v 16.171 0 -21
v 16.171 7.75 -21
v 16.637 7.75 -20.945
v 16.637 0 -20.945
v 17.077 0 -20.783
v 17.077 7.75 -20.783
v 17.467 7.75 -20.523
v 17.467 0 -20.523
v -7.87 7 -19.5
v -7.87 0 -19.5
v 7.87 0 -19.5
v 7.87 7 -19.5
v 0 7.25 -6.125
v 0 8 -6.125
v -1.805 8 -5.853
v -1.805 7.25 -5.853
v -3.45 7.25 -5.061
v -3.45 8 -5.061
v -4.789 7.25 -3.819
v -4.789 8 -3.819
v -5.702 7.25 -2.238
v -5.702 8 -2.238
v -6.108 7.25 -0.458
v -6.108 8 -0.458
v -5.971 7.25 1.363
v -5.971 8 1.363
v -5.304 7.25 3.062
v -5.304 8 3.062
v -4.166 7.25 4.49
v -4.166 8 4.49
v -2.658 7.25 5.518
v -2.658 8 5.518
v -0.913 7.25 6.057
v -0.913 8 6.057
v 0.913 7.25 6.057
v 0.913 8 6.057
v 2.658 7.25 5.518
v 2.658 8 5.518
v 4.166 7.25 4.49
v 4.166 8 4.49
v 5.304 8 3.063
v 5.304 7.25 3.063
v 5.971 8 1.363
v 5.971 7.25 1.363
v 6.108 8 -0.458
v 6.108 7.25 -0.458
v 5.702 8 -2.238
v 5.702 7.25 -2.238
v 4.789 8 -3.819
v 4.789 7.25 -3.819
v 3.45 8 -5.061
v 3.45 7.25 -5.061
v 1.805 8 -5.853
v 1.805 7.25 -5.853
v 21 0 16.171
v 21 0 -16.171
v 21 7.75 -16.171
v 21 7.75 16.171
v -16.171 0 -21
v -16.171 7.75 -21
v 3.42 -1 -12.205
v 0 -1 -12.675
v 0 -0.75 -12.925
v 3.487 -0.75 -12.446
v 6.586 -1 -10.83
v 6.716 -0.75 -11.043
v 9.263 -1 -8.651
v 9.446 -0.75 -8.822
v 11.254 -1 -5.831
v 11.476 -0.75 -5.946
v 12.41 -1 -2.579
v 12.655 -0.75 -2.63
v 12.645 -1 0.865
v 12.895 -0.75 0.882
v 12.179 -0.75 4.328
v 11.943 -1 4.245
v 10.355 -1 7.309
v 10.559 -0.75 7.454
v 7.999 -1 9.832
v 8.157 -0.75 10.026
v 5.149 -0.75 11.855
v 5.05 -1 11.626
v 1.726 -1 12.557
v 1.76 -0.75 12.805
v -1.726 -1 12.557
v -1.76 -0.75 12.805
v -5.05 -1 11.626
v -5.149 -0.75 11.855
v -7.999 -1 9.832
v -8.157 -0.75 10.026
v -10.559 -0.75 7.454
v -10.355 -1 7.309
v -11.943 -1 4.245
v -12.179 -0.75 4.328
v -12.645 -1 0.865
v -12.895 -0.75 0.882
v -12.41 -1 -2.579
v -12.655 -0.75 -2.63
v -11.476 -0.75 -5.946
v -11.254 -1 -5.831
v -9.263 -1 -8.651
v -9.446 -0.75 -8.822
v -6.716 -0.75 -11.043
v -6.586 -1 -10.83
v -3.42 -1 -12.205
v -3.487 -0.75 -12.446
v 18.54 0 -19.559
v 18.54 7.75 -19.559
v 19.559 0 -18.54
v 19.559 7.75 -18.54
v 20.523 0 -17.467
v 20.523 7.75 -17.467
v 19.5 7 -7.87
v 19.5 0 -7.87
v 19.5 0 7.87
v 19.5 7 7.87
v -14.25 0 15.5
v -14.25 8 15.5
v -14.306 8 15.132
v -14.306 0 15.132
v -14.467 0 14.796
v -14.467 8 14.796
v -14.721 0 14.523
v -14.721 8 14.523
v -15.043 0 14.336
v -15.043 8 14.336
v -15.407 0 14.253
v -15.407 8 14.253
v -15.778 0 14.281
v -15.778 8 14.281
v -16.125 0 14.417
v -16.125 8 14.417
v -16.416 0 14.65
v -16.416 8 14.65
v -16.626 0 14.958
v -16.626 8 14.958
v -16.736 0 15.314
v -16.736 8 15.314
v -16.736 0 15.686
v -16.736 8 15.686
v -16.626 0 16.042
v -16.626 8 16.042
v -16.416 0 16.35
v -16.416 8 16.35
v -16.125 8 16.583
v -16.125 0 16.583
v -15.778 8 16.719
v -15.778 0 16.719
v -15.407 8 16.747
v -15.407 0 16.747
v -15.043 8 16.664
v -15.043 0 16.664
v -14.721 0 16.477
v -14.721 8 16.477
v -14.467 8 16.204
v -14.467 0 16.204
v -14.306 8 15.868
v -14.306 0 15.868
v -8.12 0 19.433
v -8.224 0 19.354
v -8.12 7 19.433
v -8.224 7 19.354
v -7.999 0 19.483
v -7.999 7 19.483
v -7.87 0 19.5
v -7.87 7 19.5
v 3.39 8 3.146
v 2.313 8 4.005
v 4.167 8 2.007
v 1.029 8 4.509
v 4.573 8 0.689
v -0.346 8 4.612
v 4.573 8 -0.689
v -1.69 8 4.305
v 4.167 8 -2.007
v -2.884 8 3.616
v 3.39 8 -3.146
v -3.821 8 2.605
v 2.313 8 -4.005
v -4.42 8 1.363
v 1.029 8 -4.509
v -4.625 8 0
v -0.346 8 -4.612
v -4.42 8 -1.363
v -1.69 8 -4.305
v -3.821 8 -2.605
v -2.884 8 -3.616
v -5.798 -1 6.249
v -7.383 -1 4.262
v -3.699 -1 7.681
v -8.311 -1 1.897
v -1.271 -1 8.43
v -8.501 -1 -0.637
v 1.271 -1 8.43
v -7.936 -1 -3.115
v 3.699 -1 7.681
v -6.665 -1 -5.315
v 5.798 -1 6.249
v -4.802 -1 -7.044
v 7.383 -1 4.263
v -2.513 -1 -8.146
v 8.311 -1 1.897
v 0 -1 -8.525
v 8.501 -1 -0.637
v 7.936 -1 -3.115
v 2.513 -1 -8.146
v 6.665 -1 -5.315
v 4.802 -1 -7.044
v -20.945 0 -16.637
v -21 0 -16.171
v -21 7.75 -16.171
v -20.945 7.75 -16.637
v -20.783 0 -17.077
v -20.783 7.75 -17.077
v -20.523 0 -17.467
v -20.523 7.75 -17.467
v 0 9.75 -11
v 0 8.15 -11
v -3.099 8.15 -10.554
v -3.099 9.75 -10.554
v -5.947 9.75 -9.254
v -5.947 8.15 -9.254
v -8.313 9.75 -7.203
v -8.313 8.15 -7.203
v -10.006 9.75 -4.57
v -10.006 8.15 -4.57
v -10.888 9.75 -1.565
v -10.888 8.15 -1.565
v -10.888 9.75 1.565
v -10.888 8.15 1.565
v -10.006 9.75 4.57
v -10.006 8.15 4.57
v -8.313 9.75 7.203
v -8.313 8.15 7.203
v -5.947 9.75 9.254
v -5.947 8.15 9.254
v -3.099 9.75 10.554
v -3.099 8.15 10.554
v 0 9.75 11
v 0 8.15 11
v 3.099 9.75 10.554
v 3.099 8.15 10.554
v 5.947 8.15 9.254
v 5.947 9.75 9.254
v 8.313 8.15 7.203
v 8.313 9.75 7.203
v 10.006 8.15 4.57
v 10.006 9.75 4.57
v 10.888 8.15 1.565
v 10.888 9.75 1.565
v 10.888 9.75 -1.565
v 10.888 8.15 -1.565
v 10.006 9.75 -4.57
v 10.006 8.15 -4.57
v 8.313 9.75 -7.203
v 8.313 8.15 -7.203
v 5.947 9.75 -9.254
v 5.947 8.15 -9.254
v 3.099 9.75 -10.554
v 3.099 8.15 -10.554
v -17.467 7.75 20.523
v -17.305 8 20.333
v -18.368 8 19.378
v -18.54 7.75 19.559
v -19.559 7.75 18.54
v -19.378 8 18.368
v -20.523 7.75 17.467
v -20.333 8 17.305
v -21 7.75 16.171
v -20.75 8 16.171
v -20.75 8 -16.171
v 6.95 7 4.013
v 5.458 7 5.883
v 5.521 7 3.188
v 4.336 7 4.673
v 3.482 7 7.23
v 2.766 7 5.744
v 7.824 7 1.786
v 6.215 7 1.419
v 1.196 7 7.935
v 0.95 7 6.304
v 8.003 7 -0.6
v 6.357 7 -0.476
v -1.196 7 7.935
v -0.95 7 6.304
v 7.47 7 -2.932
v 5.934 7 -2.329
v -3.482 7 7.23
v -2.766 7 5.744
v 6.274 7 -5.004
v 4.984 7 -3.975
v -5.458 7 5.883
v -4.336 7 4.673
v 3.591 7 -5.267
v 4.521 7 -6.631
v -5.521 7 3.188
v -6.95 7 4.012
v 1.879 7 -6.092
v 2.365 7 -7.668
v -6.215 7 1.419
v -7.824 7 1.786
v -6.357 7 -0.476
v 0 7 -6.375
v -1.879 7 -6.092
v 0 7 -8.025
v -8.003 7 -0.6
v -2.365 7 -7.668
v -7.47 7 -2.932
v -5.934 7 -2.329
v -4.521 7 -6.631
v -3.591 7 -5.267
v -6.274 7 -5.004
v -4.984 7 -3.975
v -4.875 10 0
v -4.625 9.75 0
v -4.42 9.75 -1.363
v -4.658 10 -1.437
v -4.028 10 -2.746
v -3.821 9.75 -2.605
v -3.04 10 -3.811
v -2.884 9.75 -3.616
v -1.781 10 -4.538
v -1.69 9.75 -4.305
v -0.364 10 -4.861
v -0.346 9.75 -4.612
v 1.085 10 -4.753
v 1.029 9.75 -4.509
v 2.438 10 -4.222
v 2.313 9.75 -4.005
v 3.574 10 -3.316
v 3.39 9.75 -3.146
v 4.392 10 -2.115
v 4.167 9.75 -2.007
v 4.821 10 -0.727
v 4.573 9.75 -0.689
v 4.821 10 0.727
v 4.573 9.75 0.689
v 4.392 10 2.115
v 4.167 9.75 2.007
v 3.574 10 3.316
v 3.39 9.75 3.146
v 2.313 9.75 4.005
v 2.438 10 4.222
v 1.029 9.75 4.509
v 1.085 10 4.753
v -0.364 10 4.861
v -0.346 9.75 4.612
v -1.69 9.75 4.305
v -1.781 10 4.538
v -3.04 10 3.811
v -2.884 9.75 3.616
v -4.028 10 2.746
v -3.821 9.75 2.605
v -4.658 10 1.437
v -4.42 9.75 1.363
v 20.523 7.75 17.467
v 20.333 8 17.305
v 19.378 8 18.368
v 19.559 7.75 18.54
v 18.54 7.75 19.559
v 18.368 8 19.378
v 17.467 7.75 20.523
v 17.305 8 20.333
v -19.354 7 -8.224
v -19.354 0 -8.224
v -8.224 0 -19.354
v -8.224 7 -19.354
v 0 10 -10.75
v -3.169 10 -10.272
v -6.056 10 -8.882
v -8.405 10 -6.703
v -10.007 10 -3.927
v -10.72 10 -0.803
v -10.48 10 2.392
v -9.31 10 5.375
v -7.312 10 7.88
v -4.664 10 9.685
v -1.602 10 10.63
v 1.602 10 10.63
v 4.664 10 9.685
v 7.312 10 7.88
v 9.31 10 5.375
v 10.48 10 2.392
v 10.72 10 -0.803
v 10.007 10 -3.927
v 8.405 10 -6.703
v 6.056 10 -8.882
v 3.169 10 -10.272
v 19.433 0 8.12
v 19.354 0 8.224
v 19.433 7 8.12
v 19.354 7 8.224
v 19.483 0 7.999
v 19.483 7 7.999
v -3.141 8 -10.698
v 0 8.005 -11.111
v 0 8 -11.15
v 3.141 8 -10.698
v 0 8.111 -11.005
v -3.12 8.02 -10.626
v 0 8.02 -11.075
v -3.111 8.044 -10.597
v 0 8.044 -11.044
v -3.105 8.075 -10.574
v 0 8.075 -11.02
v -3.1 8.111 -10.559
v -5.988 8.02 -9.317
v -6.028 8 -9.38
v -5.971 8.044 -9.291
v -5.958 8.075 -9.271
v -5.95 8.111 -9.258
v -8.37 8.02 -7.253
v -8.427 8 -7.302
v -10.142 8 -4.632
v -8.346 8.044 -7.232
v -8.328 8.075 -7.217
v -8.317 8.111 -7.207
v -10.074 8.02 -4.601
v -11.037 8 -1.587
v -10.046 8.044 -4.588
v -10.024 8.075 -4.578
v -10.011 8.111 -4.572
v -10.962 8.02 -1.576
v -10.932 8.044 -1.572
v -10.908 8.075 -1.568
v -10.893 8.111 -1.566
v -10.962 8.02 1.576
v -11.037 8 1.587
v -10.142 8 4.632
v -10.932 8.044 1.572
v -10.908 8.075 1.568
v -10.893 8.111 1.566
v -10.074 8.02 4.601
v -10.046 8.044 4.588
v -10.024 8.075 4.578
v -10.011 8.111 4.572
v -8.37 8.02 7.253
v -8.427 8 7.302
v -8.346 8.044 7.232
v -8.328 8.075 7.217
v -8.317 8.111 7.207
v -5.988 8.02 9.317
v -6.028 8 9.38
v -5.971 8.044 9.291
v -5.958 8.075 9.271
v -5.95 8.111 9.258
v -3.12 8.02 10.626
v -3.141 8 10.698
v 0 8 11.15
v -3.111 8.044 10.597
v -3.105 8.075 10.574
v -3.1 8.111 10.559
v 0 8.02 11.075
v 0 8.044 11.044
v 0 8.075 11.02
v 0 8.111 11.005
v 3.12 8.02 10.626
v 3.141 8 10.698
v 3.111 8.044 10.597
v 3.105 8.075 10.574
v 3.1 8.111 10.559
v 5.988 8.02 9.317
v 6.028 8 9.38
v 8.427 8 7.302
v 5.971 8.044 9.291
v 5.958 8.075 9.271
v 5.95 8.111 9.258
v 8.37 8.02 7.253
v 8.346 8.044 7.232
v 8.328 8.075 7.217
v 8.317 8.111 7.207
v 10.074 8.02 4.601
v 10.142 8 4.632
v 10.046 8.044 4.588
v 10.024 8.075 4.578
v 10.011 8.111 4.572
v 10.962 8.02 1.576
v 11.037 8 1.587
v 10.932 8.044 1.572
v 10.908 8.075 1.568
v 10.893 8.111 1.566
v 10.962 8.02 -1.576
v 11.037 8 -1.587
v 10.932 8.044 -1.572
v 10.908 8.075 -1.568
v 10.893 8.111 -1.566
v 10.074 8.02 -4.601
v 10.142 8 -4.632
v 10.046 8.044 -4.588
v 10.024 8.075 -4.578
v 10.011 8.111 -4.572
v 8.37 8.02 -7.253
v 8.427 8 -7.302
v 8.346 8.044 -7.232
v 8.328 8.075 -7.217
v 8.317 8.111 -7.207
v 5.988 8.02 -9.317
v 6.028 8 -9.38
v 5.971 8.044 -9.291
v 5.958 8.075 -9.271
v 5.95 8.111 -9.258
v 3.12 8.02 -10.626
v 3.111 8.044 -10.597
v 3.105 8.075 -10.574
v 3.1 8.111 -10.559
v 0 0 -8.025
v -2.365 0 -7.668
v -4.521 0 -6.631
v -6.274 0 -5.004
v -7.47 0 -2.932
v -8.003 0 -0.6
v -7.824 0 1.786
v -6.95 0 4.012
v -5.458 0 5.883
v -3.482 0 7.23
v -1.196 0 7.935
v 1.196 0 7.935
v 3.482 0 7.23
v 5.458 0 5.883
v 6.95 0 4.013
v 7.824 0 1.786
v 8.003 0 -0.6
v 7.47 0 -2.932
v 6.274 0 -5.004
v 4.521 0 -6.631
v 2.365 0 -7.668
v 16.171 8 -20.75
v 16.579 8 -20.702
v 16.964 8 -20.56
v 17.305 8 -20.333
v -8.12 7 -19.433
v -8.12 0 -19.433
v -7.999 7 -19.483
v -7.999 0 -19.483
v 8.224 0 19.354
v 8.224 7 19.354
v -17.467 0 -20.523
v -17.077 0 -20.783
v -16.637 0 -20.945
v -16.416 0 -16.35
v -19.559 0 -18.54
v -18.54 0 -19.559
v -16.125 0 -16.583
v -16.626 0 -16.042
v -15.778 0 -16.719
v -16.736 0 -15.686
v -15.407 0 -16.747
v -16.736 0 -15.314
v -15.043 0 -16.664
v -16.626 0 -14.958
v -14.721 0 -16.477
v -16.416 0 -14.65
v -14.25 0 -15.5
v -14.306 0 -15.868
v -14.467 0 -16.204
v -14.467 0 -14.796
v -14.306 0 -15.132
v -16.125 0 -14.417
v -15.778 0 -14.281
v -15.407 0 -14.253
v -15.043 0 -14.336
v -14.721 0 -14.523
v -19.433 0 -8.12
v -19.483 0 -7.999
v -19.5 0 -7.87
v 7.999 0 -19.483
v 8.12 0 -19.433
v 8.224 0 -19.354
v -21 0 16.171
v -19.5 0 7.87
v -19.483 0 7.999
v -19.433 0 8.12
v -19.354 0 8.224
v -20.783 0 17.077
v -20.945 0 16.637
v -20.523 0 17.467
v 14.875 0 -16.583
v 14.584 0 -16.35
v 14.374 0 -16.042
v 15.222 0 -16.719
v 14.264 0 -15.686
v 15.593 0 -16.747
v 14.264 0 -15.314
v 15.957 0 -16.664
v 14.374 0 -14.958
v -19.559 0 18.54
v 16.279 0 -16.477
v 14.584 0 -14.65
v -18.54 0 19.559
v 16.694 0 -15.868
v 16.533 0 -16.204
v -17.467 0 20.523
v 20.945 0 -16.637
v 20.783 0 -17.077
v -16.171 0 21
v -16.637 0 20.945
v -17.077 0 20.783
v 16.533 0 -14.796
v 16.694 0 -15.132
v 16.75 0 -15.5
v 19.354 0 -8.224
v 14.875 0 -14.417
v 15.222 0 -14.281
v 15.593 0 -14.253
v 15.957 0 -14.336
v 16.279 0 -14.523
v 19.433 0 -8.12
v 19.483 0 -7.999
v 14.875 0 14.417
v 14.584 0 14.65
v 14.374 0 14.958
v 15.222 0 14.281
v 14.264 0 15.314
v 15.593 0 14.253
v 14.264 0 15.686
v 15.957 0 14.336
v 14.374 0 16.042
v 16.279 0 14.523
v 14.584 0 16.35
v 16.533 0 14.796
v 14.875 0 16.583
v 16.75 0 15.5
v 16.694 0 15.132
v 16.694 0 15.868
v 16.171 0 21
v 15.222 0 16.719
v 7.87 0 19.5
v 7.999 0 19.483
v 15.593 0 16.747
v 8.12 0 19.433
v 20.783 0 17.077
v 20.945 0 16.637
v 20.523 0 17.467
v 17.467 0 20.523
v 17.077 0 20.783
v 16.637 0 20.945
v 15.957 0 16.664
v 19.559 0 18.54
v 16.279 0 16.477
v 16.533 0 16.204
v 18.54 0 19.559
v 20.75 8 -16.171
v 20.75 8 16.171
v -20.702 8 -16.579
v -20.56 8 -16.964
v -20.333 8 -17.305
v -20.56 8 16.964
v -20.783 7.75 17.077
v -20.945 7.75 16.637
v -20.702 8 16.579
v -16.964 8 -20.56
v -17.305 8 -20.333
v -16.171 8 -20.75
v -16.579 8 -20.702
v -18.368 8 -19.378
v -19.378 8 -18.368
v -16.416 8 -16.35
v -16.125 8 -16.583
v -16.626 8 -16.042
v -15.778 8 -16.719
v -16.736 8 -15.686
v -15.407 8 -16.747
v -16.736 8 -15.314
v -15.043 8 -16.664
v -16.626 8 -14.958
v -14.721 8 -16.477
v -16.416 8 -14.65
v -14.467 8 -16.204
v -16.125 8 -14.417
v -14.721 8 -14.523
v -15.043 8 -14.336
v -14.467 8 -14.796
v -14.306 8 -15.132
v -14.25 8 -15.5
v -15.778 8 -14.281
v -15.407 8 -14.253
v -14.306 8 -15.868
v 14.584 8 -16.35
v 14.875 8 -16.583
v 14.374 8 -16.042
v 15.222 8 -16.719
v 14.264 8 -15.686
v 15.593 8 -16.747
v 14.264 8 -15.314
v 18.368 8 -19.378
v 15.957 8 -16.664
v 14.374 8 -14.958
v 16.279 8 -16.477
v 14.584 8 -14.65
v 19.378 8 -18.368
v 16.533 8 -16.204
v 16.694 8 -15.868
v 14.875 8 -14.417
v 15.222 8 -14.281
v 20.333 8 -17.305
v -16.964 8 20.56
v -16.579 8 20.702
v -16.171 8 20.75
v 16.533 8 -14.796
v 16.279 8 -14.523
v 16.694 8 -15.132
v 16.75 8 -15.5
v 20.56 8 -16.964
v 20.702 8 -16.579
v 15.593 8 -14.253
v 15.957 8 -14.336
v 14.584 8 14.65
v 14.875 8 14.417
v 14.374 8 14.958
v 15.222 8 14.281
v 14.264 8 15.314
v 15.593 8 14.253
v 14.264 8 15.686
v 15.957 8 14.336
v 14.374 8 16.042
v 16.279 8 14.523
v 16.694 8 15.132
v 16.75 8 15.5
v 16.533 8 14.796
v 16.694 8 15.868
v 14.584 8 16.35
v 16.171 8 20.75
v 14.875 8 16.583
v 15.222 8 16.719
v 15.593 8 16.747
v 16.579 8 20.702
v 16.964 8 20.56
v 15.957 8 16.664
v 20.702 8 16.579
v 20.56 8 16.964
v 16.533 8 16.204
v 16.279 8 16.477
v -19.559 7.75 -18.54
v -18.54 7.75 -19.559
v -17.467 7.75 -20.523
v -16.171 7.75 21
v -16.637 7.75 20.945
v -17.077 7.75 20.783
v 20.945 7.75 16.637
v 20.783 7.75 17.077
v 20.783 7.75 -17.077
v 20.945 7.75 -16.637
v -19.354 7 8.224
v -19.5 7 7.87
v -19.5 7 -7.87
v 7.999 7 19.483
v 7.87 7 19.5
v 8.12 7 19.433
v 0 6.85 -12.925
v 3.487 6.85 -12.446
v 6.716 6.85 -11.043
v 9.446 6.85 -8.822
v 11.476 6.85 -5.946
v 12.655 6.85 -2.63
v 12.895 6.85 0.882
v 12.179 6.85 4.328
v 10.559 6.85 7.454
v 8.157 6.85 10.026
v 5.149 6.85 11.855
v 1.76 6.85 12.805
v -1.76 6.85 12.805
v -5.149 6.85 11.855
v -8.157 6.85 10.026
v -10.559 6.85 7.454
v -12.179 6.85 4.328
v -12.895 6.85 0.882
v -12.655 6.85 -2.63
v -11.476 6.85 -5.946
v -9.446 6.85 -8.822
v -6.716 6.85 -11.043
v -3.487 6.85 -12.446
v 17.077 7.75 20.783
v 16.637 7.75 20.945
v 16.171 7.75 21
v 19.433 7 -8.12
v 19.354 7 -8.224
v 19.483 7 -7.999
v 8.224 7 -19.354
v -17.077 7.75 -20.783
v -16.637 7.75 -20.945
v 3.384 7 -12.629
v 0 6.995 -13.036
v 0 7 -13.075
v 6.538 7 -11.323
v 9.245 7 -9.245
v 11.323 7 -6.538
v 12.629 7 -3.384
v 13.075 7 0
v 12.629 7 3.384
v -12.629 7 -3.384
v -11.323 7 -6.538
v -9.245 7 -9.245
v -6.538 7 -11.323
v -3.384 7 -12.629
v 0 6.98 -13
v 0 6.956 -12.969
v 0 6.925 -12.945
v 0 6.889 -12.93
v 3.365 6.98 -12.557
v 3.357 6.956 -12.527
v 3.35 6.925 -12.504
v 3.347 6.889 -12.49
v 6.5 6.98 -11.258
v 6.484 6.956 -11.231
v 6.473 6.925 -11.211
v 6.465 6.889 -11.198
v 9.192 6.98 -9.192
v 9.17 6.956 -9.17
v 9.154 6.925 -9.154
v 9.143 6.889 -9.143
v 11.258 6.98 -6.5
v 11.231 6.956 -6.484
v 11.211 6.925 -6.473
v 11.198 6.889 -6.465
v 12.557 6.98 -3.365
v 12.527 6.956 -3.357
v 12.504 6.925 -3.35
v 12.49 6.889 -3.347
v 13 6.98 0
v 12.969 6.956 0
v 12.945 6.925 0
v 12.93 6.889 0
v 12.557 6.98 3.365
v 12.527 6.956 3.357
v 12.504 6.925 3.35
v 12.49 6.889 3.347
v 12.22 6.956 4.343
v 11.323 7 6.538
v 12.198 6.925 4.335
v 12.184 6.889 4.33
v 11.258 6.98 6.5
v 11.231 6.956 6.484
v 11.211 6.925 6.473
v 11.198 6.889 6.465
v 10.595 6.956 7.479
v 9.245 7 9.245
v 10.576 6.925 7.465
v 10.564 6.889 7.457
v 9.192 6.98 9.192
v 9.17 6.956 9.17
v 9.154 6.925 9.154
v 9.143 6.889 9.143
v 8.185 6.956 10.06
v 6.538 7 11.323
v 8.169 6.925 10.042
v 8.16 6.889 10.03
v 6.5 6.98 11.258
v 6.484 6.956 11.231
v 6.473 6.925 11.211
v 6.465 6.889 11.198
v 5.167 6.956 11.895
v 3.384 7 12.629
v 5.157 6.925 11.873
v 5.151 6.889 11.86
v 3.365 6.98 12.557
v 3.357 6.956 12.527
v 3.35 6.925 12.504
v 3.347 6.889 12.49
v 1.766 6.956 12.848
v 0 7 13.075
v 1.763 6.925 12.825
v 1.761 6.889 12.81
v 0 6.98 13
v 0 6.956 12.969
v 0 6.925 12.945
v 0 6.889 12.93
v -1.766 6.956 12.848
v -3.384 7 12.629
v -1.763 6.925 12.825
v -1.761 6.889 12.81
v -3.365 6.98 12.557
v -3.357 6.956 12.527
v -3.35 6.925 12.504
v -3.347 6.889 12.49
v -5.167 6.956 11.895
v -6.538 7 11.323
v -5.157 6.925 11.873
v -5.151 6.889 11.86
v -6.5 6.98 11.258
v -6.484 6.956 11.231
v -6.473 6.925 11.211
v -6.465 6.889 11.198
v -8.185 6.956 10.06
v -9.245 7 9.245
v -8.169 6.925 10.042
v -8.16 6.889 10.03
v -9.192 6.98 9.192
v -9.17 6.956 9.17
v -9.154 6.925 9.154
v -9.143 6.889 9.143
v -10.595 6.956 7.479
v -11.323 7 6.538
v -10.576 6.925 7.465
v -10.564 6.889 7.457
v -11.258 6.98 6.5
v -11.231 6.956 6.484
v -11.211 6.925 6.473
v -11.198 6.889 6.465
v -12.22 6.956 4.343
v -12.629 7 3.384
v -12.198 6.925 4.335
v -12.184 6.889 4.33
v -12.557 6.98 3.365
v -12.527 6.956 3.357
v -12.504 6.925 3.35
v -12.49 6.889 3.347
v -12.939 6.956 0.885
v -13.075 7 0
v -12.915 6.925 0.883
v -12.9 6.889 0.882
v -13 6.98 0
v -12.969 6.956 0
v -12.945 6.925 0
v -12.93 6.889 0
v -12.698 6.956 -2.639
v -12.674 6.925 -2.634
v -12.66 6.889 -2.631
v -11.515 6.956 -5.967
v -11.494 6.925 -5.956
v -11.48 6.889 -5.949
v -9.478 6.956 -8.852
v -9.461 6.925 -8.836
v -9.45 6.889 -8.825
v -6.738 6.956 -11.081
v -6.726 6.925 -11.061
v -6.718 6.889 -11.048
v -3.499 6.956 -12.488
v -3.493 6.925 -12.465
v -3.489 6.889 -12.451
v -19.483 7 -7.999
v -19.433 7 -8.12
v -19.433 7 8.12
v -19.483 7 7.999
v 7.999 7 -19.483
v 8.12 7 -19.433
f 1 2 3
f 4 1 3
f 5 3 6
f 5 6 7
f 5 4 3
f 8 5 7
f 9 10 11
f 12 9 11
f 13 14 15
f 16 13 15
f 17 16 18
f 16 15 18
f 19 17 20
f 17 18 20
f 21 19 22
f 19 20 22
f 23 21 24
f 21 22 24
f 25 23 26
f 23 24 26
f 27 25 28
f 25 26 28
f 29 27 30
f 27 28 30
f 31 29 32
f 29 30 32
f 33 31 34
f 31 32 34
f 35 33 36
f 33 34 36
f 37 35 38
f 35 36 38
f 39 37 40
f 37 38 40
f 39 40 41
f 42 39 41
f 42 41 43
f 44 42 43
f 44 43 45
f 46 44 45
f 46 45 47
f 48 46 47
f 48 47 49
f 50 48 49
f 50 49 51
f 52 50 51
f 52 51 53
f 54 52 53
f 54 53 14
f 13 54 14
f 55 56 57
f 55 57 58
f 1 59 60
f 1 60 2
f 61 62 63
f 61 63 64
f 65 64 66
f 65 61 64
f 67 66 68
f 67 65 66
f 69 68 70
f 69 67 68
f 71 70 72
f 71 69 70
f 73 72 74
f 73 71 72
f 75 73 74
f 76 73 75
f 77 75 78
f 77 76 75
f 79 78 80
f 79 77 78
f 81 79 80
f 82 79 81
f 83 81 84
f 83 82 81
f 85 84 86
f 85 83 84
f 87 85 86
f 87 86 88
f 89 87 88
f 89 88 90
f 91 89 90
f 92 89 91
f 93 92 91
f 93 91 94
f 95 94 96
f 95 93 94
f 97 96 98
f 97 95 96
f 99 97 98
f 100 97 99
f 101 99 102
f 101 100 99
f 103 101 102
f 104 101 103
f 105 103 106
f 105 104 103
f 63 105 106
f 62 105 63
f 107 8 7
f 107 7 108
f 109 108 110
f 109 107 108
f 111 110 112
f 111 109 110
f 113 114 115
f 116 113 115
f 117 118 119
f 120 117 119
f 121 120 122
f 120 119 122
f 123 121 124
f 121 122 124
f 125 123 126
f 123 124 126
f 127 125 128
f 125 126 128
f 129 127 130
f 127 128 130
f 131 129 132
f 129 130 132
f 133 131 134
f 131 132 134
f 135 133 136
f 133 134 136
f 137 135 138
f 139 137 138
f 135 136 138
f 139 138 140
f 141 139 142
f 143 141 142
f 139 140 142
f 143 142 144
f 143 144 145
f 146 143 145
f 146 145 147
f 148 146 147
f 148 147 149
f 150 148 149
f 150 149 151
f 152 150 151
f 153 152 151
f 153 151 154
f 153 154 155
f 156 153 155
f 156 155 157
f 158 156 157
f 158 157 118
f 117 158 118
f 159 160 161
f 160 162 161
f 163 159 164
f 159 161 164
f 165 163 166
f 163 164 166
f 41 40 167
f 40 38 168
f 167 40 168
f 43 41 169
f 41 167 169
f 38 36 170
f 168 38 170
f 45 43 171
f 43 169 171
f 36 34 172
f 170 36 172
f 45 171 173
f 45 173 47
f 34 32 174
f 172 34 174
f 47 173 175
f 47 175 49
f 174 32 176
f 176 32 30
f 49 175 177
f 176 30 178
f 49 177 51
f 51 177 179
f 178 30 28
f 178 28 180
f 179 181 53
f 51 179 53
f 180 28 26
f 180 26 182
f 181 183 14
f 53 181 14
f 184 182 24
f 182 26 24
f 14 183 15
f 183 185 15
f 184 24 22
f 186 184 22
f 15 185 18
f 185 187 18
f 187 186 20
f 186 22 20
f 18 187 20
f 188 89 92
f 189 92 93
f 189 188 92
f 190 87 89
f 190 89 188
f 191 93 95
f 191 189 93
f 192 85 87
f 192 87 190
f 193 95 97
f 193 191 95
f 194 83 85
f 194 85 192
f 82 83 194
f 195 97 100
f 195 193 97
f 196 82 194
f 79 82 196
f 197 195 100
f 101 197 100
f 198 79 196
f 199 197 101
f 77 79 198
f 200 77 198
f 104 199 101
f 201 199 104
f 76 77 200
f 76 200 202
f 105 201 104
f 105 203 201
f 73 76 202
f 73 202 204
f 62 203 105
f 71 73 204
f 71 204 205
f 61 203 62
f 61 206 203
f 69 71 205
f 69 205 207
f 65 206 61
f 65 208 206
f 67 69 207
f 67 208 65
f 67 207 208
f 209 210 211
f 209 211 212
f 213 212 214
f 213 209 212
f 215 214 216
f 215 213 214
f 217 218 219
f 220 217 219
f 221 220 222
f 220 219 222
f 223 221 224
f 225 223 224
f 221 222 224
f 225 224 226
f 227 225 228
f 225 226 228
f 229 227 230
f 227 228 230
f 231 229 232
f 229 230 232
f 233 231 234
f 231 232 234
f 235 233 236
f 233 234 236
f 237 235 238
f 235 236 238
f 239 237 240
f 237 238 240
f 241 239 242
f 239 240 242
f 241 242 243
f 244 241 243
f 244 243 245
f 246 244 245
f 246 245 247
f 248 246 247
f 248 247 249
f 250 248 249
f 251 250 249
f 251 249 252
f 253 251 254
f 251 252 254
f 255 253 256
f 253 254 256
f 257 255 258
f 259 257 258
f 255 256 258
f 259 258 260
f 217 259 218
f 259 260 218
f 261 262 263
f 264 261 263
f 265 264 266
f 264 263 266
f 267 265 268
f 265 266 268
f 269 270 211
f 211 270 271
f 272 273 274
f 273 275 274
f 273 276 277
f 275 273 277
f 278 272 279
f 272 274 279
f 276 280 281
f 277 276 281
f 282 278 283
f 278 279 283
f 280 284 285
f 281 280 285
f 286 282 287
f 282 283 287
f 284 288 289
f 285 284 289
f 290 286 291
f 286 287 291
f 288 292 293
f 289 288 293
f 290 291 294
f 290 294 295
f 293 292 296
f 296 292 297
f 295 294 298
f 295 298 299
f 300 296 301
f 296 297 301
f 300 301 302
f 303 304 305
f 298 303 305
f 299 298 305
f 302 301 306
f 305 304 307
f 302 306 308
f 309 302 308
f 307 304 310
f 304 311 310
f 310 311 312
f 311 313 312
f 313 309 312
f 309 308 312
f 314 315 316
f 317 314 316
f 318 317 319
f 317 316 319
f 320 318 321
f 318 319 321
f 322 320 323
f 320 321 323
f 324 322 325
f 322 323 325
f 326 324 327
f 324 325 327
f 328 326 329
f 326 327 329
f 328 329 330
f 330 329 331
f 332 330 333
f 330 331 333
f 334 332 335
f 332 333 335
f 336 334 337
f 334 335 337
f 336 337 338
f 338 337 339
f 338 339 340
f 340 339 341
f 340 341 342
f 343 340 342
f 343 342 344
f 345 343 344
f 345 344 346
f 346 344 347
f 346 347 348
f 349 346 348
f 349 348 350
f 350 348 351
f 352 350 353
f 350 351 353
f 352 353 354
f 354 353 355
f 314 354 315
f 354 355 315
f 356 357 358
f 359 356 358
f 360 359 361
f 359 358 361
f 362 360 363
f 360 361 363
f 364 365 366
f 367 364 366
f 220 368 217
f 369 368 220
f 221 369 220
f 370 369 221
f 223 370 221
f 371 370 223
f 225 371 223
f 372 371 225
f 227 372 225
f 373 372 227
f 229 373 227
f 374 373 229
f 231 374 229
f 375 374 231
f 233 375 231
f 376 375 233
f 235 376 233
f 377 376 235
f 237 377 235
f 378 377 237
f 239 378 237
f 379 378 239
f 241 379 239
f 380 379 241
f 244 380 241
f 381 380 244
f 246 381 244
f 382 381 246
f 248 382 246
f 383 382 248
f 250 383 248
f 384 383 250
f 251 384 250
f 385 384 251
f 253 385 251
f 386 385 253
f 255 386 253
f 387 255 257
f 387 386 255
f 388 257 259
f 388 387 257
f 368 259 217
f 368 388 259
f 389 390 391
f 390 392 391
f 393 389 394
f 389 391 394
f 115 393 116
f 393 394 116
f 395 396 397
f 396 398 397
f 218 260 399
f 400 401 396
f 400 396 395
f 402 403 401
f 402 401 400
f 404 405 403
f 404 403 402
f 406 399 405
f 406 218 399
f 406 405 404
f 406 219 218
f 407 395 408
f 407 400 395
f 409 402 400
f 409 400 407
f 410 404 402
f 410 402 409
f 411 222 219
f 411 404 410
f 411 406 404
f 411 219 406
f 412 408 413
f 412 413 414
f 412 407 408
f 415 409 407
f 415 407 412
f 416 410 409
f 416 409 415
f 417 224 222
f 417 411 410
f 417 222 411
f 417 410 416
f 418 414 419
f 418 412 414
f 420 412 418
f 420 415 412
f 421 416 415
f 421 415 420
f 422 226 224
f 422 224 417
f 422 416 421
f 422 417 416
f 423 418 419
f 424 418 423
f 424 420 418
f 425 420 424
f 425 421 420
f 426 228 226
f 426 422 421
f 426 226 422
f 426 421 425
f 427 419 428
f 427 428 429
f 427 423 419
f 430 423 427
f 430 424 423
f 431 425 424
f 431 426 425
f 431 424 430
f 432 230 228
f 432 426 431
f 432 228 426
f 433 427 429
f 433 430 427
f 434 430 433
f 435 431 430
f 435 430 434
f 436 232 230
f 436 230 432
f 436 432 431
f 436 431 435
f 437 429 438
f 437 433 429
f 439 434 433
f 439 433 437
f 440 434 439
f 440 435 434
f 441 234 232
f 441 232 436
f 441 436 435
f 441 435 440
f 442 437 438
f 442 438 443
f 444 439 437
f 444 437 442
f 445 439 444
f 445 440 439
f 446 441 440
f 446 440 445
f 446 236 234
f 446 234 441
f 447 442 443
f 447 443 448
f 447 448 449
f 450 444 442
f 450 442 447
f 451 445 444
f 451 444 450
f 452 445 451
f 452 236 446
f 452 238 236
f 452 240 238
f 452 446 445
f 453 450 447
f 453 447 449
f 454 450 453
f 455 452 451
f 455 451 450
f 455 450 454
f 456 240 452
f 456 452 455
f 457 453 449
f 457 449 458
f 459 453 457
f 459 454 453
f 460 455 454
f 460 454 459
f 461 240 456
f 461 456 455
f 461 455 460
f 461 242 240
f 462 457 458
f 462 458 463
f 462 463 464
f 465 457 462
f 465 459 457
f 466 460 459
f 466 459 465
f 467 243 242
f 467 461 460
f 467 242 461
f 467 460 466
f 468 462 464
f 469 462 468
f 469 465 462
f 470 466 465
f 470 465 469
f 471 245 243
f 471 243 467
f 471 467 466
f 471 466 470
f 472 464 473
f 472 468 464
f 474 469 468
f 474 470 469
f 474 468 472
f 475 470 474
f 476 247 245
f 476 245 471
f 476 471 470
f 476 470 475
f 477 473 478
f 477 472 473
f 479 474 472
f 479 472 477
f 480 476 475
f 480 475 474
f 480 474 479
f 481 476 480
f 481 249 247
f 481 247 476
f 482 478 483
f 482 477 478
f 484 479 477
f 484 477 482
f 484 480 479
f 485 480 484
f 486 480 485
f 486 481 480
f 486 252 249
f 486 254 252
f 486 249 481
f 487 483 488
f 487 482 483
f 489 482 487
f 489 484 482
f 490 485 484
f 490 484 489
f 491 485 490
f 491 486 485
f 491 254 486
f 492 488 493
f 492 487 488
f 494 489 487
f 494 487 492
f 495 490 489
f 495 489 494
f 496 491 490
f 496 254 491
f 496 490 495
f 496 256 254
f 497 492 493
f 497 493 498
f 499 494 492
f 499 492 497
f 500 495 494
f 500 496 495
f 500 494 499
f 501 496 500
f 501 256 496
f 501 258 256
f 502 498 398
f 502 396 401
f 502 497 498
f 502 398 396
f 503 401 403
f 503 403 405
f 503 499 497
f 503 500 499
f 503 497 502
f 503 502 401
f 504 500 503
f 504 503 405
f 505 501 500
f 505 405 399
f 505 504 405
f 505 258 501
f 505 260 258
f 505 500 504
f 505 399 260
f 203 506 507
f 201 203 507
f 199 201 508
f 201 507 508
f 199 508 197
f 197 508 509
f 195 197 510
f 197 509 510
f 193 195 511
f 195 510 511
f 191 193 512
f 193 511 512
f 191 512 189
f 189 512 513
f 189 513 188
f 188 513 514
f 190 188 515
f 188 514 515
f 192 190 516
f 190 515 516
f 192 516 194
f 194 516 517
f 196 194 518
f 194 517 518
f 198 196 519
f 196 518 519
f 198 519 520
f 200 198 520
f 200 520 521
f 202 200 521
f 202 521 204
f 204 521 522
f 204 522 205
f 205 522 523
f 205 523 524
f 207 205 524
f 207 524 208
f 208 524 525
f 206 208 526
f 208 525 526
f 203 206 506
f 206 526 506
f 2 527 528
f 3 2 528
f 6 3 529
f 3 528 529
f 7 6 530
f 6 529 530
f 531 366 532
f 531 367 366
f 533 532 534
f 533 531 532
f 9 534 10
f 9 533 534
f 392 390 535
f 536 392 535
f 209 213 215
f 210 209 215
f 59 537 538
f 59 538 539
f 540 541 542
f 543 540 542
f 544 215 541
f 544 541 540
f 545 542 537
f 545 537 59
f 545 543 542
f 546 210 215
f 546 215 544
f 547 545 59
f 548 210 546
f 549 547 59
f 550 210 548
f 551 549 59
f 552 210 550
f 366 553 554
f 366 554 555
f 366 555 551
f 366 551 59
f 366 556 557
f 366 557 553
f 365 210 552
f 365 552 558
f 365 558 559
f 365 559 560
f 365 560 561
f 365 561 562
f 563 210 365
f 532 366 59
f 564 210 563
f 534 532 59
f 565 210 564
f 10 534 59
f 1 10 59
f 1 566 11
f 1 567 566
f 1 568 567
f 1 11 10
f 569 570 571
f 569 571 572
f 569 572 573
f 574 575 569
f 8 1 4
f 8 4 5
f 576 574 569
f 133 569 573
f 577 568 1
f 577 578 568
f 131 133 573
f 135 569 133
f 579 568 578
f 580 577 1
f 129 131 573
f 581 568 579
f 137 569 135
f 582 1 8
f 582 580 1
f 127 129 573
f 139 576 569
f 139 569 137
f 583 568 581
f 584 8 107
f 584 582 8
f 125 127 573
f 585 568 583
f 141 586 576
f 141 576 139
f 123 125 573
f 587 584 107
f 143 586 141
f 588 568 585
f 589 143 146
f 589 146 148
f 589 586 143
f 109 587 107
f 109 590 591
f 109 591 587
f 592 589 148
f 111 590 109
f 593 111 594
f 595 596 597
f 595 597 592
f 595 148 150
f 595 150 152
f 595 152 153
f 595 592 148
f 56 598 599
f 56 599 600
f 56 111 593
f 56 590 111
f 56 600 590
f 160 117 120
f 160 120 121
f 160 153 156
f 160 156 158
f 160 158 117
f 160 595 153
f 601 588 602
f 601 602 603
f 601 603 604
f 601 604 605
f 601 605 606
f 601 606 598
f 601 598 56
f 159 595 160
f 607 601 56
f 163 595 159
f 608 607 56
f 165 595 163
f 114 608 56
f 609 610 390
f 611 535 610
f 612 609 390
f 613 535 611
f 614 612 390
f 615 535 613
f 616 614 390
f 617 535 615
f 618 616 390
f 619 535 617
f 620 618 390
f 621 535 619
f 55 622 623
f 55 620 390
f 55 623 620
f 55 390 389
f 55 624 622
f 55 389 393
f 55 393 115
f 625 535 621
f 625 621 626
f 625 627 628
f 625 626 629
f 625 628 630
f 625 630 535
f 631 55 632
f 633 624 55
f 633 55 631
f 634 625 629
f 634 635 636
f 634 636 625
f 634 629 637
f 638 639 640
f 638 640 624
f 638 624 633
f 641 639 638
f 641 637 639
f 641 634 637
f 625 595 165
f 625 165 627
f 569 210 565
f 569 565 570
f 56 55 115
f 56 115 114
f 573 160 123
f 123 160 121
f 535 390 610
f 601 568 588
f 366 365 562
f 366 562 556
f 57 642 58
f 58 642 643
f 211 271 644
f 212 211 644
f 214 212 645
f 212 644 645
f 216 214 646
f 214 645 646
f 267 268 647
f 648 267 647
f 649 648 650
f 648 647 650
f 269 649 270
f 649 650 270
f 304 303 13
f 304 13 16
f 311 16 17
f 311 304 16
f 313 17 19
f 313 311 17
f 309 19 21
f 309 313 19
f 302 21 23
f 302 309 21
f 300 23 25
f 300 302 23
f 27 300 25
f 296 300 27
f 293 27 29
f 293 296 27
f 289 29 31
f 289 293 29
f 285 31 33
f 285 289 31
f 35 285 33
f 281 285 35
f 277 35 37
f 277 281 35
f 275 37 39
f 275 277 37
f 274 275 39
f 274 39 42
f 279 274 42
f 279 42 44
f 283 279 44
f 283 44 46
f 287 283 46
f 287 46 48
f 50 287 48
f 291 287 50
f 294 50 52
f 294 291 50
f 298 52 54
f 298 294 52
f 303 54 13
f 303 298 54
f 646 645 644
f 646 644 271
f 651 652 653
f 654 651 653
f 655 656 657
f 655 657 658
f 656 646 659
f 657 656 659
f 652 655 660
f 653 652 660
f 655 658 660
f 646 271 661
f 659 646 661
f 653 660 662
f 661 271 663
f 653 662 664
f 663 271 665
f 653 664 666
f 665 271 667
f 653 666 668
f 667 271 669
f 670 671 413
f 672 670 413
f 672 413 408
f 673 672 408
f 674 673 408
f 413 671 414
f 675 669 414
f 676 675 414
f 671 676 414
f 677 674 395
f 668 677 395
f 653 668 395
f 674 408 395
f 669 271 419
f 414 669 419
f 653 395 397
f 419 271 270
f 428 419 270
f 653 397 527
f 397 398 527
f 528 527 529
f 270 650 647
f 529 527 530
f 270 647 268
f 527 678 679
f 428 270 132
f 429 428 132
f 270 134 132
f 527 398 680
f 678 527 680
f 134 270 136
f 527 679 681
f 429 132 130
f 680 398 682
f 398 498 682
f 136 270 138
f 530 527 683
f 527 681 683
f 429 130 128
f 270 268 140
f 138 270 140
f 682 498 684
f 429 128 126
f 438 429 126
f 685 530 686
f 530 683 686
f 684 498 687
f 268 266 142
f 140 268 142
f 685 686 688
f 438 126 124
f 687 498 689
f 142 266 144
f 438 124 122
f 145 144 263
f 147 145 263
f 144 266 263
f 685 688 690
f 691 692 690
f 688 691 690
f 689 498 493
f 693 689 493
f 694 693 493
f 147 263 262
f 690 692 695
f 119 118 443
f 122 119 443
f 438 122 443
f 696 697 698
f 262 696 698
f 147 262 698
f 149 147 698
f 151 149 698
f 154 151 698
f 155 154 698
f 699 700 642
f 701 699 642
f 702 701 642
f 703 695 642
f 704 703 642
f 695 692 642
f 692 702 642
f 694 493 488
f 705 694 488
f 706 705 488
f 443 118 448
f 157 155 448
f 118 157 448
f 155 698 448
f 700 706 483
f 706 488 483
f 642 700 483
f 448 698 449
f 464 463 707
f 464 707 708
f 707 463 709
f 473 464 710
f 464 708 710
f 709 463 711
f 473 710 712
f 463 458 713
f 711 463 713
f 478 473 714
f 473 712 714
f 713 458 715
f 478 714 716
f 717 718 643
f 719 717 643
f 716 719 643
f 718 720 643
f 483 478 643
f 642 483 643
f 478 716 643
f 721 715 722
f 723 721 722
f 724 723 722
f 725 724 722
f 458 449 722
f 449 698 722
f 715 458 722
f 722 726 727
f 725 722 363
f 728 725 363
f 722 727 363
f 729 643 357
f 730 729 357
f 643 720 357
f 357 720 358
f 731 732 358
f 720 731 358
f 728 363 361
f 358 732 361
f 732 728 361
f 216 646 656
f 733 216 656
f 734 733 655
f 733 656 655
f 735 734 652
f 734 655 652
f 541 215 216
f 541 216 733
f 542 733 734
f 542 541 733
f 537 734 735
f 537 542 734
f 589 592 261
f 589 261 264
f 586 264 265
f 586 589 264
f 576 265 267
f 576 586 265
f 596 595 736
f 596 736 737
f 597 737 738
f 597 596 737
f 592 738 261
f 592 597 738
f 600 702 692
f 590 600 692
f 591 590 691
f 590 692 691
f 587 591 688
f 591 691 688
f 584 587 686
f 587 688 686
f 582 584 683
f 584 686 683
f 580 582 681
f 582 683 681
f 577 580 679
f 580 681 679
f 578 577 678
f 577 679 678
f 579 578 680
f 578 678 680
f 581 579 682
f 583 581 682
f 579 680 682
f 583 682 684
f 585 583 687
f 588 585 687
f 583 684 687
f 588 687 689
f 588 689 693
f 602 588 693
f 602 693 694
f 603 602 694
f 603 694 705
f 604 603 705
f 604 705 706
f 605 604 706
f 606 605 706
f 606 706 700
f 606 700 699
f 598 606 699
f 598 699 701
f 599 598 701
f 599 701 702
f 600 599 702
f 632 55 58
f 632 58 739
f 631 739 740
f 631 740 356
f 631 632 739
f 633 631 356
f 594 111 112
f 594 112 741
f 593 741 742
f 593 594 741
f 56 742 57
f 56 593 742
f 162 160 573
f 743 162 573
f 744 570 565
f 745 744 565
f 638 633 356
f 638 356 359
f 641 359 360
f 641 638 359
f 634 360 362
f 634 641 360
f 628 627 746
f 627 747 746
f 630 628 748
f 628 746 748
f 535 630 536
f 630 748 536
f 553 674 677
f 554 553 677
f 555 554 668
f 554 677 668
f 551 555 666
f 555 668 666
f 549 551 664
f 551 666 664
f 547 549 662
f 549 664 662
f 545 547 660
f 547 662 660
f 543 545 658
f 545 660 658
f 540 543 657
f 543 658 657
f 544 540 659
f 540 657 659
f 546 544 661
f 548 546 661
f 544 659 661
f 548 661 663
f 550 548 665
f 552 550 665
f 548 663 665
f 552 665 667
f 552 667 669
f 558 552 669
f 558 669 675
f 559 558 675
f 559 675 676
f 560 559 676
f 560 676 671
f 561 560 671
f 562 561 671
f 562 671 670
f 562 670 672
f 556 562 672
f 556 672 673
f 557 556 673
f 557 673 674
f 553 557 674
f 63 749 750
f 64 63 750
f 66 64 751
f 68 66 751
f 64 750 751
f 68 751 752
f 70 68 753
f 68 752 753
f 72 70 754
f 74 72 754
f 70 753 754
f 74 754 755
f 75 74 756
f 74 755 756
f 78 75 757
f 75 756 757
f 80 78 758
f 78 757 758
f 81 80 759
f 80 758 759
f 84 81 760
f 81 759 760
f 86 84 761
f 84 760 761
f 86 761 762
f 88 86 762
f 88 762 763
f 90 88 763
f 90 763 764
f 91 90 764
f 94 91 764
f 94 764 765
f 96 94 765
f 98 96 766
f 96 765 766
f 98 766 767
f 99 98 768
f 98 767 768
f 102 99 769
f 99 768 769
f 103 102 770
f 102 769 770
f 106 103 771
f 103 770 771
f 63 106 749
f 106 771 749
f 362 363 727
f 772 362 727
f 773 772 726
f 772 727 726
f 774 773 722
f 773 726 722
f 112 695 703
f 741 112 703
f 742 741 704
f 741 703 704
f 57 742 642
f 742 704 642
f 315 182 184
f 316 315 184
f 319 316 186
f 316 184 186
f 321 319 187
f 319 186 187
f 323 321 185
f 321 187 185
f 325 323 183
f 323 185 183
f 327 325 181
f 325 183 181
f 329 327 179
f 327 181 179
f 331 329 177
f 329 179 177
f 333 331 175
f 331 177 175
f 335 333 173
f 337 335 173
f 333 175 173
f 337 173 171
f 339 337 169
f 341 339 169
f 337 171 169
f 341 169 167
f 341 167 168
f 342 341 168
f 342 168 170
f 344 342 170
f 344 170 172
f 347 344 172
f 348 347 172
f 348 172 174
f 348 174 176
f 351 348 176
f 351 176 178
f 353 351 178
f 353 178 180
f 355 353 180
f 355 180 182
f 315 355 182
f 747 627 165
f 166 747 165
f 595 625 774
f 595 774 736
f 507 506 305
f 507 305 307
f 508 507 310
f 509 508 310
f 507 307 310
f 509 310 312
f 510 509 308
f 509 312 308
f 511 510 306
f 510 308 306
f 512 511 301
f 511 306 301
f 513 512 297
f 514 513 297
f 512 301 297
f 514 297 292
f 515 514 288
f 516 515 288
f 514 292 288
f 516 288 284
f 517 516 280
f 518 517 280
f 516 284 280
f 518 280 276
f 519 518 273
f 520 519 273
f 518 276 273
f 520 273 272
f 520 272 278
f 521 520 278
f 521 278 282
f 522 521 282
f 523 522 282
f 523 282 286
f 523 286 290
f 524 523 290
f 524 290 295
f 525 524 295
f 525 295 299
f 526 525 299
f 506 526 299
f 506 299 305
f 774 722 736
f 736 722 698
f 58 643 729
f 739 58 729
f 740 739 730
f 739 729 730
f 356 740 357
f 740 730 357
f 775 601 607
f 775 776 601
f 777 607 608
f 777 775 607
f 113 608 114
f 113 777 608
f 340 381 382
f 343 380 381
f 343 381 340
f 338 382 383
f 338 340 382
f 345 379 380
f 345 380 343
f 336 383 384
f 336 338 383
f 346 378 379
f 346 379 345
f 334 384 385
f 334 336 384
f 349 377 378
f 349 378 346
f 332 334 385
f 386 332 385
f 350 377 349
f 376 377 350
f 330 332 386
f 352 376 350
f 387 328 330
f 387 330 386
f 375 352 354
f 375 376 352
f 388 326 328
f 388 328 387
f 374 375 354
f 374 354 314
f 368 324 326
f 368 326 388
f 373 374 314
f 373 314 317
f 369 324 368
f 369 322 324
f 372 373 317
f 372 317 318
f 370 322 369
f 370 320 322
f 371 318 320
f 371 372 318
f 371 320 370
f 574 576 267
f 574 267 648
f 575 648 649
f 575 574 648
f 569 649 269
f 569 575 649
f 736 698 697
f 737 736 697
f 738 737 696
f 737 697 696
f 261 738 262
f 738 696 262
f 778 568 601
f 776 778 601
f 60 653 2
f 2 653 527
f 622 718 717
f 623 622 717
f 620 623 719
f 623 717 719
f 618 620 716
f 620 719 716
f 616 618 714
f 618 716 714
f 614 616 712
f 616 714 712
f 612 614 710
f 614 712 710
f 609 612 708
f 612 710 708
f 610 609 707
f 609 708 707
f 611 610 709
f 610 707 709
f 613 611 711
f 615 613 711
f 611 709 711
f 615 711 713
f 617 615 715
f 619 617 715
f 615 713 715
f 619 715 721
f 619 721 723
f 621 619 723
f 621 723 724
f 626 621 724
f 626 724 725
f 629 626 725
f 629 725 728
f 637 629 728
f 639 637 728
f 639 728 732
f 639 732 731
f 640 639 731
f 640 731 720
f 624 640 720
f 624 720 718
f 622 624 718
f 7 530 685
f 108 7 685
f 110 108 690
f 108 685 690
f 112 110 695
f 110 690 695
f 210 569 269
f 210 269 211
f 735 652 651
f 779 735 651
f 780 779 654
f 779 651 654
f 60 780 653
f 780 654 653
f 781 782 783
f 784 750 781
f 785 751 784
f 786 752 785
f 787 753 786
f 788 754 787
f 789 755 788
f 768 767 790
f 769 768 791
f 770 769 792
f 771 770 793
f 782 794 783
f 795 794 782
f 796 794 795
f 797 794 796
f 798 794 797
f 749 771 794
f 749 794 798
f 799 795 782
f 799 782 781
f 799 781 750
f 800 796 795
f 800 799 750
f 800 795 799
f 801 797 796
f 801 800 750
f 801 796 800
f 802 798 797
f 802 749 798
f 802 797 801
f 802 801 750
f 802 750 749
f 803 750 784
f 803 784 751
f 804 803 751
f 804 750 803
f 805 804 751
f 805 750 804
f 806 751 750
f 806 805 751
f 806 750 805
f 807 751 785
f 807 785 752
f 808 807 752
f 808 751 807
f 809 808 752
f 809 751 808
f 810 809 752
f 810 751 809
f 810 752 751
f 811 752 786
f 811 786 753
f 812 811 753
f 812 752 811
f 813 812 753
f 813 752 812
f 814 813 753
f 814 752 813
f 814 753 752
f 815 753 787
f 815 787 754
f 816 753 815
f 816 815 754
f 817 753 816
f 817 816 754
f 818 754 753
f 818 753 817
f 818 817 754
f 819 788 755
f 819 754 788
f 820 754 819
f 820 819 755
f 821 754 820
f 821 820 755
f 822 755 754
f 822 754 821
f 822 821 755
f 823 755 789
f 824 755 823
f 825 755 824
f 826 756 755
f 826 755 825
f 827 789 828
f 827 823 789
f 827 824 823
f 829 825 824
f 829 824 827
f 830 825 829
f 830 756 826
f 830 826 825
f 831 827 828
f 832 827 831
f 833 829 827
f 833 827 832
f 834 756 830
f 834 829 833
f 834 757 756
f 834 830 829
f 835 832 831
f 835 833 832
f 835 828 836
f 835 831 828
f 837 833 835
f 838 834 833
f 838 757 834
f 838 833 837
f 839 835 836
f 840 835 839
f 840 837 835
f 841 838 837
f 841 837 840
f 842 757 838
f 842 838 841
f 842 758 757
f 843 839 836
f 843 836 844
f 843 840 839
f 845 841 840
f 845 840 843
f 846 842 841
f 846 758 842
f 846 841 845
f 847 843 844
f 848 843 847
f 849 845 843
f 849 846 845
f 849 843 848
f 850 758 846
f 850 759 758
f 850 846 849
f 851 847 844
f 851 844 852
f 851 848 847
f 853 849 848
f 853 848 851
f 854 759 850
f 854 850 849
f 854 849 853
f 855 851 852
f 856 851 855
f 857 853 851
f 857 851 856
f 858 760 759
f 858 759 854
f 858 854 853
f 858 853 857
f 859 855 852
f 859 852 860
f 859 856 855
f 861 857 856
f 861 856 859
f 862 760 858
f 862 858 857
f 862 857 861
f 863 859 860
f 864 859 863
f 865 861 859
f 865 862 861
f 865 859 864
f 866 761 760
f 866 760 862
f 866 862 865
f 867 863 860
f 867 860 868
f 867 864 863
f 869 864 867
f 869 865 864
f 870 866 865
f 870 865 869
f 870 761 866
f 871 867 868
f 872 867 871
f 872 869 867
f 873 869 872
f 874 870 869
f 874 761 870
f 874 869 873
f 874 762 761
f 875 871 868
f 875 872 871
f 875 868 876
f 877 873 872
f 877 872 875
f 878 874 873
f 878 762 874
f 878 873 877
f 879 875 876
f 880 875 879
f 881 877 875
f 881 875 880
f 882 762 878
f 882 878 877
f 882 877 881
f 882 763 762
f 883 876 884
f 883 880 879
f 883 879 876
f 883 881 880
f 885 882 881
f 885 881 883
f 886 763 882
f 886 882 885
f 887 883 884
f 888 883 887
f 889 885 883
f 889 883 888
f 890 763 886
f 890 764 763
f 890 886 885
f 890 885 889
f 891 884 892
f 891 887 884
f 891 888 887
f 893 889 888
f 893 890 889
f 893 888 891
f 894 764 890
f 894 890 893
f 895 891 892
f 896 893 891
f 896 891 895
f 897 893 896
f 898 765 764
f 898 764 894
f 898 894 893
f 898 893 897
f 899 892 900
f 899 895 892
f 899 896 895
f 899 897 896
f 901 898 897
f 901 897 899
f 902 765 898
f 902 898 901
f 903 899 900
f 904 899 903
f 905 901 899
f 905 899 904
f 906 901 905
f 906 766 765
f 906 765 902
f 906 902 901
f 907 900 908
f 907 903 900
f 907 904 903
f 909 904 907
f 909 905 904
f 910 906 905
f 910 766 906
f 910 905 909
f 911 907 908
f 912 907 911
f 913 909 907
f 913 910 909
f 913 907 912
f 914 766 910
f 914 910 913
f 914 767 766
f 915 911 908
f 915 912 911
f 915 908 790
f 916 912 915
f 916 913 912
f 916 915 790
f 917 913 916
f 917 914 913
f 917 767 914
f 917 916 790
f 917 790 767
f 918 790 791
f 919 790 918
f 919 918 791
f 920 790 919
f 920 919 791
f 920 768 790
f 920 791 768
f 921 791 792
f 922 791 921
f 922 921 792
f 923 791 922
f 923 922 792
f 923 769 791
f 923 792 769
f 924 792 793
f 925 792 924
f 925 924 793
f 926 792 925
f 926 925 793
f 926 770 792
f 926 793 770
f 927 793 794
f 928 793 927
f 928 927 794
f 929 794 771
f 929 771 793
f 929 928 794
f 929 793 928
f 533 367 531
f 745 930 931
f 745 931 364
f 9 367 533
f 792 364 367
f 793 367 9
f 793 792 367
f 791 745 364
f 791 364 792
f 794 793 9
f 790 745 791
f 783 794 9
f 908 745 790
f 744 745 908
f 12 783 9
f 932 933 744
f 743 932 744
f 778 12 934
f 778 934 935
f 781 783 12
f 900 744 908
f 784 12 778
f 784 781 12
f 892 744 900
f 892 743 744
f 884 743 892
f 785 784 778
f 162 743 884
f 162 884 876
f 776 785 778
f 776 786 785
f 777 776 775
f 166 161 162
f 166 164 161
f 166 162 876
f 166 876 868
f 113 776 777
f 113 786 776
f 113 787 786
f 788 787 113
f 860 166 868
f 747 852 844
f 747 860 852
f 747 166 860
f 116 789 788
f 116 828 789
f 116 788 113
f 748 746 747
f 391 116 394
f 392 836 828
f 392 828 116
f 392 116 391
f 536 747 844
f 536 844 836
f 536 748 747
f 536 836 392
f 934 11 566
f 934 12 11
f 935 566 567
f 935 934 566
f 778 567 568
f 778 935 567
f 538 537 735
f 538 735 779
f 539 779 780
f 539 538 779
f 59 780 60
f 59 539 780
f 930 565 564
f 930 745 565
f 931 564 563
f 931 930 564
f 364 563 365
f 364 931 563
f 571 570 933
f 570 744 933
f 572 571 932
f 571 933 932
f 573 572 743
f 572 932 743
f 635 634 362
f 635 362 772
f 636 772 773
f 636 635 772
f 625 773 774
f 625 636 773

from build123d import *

# Parameters (mm, degrees)
BOSS_EXTRUDE1_DEPTH            = 8
CUT_EXTRUDE1_DEPTH             = 7
SKETCH3_R                      = 11
BOSS_EXTRUDE2_DEPTH            = 2
SKETCH4_R                      = 12.925
BOSS_EXTRUDE3_DEPTH            = 8
SKETCH5_R                      = 8.025
CUT_EXTRUDE2_DEPTH             = 31.757112998
SKETCH6_R                      = 6.125
CUT_EXTRUDE3_DEPTH             = 32.032241298
M8_CLEARANCE_HOLE1_D           = 9.25
M8_CLEARANCE_HOLE1_DEPTH       = 11
F_2_5_2_5_DIAMETER_HOLE1_D     = 2.5
F_2_5_2_5_DIAMETER_HOLE1_DEPTH = 10
FILLET1_R                      = 0.150000001
FILLET2_R                      = 0.5
CHAMFER1_SIZE                  = 0.5
CHAMFER1_SIZE2                 = 1
CHAMFER2_SIZE                  = 0.25
CHAMFER3_SIZE                  = 0.25


with BuildPart() as part:
    # Sketch1 → Boss-Extrude1 (new body)
    with BuildSketch(Plane.XZ):
        with BuildLine():
            Line((16.171038928, 21), (-16.171038928, 21))
            ThreePointArc((-16.171038928, 21), (-16.861657425, 20.876977915), (-17.467314594, 20.523046092))
            ThreePointArc((-17.467314594, 20.523046092), (-19.056527753, 19.056527753), (-20.523046092, 17.467314594))
            ThreePointArc((-20.523046092, 17.467314594), (-20.876977915, 16.861657425), (-21, 16.171038928))
            Line((-21, 16.171038928), (-21, -16.171038928))
            ThreePointArc((-21, -16.171038928), (-20.876977915, -16.861657425), (-20.523046092, -17.467314594))
            ThreePointArc((-20.523046092, -17.467314594), (-19.056527753, -19.056527753), (-17.467314594, -20.523046092))
            ThreePointArc((-17.467314594, -20.523046092), (-16.861657425, -20.876977915), (-16.171038928, -21))
            Line((-16.171038928, -21), (16.171038928, -21))
            ThreePointArc((16.171038928, -21), (16.861657424, -20.876977915), (17.467314593, -20.523046092))
            ThreePointArc((17.467314593, -20.523046092), (19.056527753, -19.056527753), (20.523046092, -17.467314593))
            ThreePointArc((20.523046092, -17.467314593), (20.876977914, -16.861657425), (21, -16.171038928))
            Line((21, -16.171038928), (21, 16.171038928))
            ThreePointArc((21, 16.171038928), (20.876977914, 16.861657425), (20.523046092, 17.467314593))
            ThreePointArc((20.523046092, 17.467314593), (19.056527753, 19.056527753), (17.467314593, 20.523046092))
            ThreePointArc((17.467314593, 20.523046092), (16.861657424, 20.876977915), (16.171038928, 21))
        make_face()
    extrude(amount=-BOSS_EXTRUDE1_DEPTH)

    # Sketch2 → Cut-Extrude1 (cut)
    with BuildSketch(Plane.XZ):
        Polygon((-19.5, 8.077164467), (-19.5, -8.077164467), (-8.077164467, -19.5), (8.077164467, -19.5), (19.5, -8.077164467), (19.5, 8.077164467), (8.077164467, 19.5), (-8.077164467, 19.5), align=None)
    extrude(amount=-CUT_EXTRUDE1_DEPTH, mode=Mode.SUBTRACT)

    # Sketch3 → Boss-Extrude2 (add)
    with BuildSketch(Plane(origin=(0, 8, 0), x_dir=(-1, 0, 0), z_dir=(0, 1, 0))):
        with Locations(Location((0, 0, 0), (0, 0, 270))):
            Circle(SKETCH3_R)
    extrude(amount=BOSS_EXTRUDE2_DEPTH)

    # Sketch4 → Boss-Extrude3 (add)
    with BuildSketch(Plane.XZ.offset(-7)):
        with Locations(Location((0, 0, 0), (0, 0, 270))):
            Circle(SKETCH4_R)
    extrude(amount=BOSS_EXTRUDE3_DEPTH)

    # Sketch5 → Cut-Extrude2 (cut, through all)
    with BuildSketch(Plane(origin=(0, 7, 0), x_dir=(1, 0, 0), z_dir=(0, 1, 0))):
        with Locations(Location((0, 0, 0), (0, 0, 90))):
            Circle(SKETCH5_R)
    extrude(amount=-CUT_EXTRUDE2_DEPTH, mode=Mode.SUBTRACT)

    # Sketch6 → Cut-Extrude3 (cut, through all)
    with BuildSketch(Plane(origin=(0, 8, 0), x_dir=(1, 0, 0), z_dir=(0, 1, 0))):
        with Locations(Location((0, 0, 0), (0, 0, 90))):
            Circle(SKETCH6_R)
    extrude(amount=-CUT_EXTRUDE3_DEPTH, mode=Mode.SUBTRACT)

    # M8 Clearance Hole1
    with Locations(Plane(origin=(0, 10, 0), x_dir=(1, 0, 0), z_dir=(0, 1, 0))):
        with Locations((0, 0)):
            Hole(M8_CLEARANCE_HOLE1_D / 2, depth=M8_CLEARANCE_HOLE1_DEPTH)

    # Ø2.5 (2.5) Diameter Hole1
    with Locations(Plane(origin=(0, 0, 0), x_dir=(-1, 0, 0), z_dir=(0, -1, 0))):
        with Locations((15.5, 15.5), (-15.5, -15.5), (-15.5, 15.5), (15.5, -15.5)):
            Hole(F_2_5_2_5_DIAMETER_HOLE1_D / 2, depth=F_2_5_2_5_DIAMETER_HOLE1_DEPTH)

    # Fillet1
    fillet1_edges = [part.edges().sort_by_distance(p)[0] for p in [
        (0, 8, 11),
        (0, 7, 12.925),
    ]]
    fillet(fillet1_edges, radius=FILLET1_R)

    # Fillet2
    fillet2_edges = [part.edges().sort_by_distance(p)[0] for p in [
        (-19.5, 3.5, 8.077164467),
        (-8.077164467, 3.5, 19.5),
        (8.077164467, 3.5, 19.5),
        (19.5, 3.5, 8.077164467),
        (19.5, 3.5, -8.077164467),
        (8.077164467, 3.5, -19.5),
        (-8.077164467, 3.5, -19.5),
        (-19.5, 3.5, -8.077164467),
    ]]
    fillet(fillet2_edges, radius=FILLET2_R)

    # Chamfer1
    chamfer1_edges = [part.edges().sort_by_distance(p)[0] for p in [
        (0, -1, 8.025),
    ]]
    chamfer1_side = [part.faces().sort_by_distance(p)[0] for p in [
        (0, -1, 12.559425794),
    ]]
    chamfer(chamfer1_edges, length=CHAMFER1_SIZE, length2=CHAMFER1_SIZE2, reference=chamfer1_side[0])

    # Chamfer2
    chamfer2_edges = [part.edges().sort_by_distance(p)[0] for p in [
        (16.861657424, 8, 20.876977915),
        (0, 8, 21),
        (-16.861657425, 8, 20.876977915),
        (-19.056527753, 8, 19.056527753),
        (-20.876977915, 8, 16.861657425),
        (-21, 8, 0),
        (-20.876977915, 8, -16.861657425),
        (-19.056527753, 8, -19.056527753),
        (-16.861657425, 8, -20.876977915),
        (0, 8, -21),
        (20.876977914, 8, 16.861657425),
        (16.861657424, 8, -20.876977915),
        (19.056527753, 8, -19.056527753),
        (20.876977914, 8, -16.861657425),
        (21, 8, 0),
        (19.056527753, 8, 19.056527753),
    ]]
    chamfer(chamfer2_edges, length=CHAMFER2_SIZE)

    # Chamfer3
    chamfer3_edges = [part.edges().sort_by_distance(p)[0] for p in [
        (0, 10, 11),
        (0, -1, 12.925),
        (0, 7, 6.125),
        (4.625, 10, 0),
    ]]
    chamfer(chamfer3_edges, length=CHAMFER3_SIZE)


solid = part.part
